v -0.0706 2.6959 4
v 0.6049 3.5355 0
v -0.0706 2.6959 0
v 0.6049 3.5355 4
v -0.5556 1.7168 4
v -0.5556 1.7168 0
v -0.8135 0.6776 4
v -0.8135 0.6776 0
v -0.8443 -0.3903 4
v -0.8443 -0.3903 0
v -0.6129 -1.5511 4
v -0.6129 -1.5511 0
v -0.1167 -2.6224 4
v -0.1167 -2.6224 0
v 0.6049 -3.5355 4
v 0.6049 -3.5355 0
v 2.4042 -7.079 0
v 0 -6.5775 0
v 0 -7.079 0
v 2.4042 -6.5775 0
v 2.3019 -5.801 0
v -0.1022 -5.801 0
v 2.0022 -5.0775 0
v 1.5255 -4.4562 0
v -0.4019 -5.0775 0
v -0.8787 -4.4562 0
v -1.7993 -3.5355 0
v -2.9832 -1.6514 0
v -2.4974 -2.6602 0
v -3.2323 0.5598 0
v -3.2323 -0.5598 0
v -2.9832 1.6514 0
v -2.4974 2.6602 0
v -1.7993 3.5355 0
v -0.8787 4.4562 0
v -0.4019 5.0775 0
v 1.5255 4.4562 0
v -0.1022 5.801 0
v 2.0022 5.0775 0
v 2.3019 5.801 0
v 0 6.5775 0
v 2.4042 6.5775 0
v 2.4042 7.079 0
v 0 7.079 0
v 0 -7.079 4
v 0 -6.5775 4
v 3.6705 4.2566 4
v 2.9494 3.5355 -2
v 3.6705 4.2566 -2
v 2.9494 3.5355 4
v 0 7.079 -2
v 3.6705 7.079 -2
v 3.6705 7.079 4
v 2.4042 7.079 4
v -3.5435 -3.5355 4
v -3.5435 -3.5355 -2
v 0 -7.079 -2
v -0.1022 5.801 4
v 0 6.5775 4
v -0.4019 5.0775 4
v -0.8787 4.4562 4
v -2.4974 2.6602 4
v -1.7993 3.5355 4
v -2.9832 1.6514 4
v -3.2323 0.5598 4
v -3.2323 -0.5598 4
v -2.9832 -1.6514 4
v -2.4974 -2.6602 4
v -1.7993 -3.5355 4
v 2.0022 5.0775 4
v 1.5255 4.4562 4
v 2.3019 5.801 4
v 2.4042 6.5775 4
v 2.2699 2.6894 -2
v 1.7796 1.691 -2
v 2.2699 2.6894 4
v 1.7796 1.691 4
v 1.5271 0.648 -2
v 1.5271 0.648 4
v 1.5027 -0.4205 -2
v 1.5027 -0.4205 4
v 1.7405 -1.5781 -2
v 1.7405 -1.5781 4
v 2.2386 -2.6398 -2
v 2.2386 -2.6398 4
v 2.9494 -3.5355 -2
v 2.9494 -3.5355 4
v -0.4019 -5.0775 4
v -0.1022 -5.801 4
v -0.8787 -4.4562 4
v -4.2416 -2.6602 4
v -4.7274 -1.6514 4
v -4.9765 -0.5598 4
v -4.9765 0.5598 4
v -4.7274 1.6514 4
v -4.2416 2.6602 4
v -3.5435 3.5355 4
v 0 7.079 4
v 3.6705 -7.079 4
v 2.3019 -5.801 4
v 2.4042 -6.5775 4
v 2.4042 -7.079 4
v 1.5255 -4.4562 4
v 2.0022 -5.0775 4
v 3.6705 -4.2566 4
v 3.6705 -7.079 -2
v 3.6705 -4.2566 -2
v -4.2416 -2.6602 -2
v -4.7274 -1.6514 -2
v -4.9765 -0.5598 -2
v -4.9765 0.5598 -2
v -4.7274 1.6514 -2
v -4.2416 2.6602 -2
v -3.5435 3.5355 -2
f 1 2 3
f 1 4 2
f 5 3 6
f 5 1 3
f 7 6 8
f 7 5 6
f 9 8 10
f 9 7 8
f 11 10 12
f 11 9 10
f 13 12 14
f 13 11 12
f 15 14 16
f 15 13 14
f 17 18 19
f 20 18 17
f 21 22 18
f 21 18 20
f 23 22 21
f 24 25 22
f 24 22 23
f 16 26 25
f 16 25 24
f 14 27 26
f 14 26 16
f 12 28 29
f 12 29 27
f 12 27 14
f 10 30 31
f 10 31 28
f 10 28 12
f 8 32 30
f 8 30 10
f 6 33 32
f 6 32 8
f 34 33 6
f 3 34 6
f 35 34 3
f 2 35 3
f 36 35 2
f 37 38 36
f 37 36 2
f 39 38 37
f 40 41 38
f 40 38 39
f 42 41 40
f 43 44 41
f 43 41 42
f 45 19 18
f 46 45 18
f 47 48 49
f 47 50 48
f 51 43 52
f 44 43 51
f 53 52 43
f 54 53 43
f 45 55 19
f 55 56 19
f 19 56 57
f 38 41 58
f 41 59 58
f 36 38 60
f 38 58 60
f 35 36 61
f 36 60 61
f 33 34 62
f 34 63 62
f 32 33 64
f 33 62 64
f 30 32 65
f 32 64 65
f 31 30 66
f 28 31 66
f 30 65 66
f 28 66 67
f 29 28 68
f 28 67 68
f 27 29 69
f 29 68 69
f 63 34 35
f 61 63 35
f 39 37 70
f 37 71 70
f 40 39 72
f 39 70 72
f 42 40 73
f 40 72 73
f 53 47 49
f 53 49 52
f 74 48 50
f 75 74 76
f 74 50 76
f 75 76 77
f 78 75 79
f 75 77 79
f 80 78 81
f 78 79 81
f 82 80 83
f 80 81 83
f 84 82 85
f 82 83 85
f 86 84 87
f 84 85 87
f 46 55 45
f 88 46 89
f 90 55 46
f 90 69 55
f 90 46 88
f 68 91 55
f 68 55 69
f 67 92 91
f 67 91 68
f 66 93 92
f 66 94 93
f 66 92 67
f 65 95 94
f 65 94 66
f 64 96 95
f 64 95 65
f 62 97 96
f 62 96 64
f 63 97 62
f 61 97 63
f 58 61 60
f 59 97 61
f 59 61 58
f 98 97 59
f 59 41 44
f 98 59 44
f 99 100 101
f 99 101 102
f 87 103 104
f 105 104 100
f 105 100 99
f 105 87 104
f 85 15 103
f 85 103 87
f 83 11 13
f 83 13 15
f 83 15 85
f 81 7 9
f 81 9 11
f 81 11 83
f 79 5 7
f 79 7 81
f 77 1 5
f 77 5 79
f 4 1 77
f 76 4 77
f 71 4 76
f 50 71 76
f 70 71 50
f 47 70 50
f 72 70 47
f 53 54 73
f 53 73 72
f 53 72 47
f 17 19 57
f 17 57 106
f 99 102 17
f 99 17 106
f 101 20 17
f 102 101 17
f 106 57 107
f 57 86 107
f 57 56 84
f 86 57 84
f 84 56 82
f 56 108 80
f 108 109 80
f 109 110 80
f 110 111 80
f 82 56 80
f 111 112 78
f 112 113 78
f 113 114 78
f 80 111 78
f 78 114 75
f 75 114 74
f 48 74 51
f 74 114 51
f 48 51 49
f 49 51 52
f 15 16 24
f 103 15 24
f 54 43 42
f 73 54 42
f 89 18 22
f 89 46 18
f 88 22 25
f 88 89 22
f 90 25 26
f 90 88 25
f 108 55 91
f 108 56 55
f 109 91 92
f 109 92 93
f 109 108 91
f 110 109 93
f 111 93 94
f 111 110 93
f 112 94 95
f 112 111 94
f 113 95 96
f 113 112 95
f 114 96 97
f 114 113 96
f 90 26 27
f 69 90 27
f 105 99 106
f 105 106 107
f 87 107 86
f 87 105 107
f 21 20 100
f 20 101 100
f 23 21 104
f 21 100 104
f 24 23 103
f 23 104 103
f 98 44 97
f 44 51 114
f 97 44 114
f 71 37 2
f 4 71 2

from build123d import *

# Parameters (mm, degrees)
F1_DEPTH = 2
F2_DEPTH = 4
F3_R     = 5
F4_R     = 3


with BuildPart() as f1:
    # F0 (on Top) → F1 (new body)
    with BuildSketch(Plane.XY):
        Polygon((3.6705210805, 7.0790494792), (2.404163056, 7.0790494792), (2.404163056, 5.3348351503), (0, 2.9306720942), (0, 0.5860975944), (3.6705210805, 4.2566186748), align=None)
        Polygon((2.404163056, -5.3348351503), (2.404163056, -7.0790494792), (3.6705210805, -7.0790494792), (3.6705210805, -4.2566186748), (0, -0.5860975944), (0, -2.9306720942), align=None)
        Polygon((0, -5.3348351503), (0, -7.0790494792), (2.404163056, -7.0790494792), (2.404163056, -5.3348351503), (0, -2.9306720942), align=None)
        Polygon((-7.0790494792, 0), (0, -7.0790494792), (0, -5.3348351503), (-5.3348351503, 0), (0, 5.3348351503), (0, 7.0790494792), align=None)
        Polygon((2.404163056, 7.0790494792), (0, 7.0790494792), (0, 5.3348351503), (0, 2.9306720942), (2.404163056, 5.3348351503), align=None)
        Polygon((-5.3348351503, 0), (0, -5.3348351503), (0, -2.9306720942), (-2.9306720942, 0), (0, 2.9306720942), (0, 5.3348351503), align=None)
        Polygon((-2.9306720942, 0), (0, -2.9306720942), (0, -0.5860975944), (-0.5860975944, 0), (0, 0.5860975944), (0, 2.9306720942), align=None)
    extrude(amount=-F1_DEPTH)

    # F0 (on Top) → F2 (join)
    with BuildSketch(Plane.XY):
        Polygon((-7.0790494792, 0), (0, -7.0790494792), (0, -5.3348351503), (-5.3348351503, 0), (0, 5.3348351503), (0, 7.0790494792), align=None)
        Polygon((-2.9306720942, 0), (0, -2.9306720942), (0, -0.5860975944), (-0.5860975944, 0), (0, 0.5860975944), (0, 2.9306720942), align=None)
        Polygon((3.6705210805, 7.0790494792), (2.404163056, 7.0790494792), (2.404163056, 5.3348351503), (0, 2.9306720942), (0, 0.5860975944), (3.6705210805, 4.2566186748), align=None)
        Polygon((2.404163056, -5.3348351503), (2.404163056, -7.0790494792), (3.6705210805, -7.0790494792), (3.6705210805, -4.2566186748), (0, -0.5860975944), (0, -2.9306720942), align=None)
    extrude(amount=F2_DEPTH)

    # F3
    f3_edges = [f1.edges().sort_by_distance(p)[0] for p in [
        (-2.930672, 0, 2),
        (-0.586098, 0, 1),
        (-5.334835, 0, 2),
        (-7.079049, 0, 1),
    ]]
    fillet(f3_edges, radius=F3_R)

    # F4
    f4_edges = [f1.edges().sort_by_distance(p)[0] for p in [
        (2.404163, -5.334835, 2),
        (0, -5.334835, 2),
        (0, 5.334835, 2),
        (2.404163, 5.334835, 2),
    ]]
    fillet(f4_edges, radius=F4_R)


solid = f1.part
